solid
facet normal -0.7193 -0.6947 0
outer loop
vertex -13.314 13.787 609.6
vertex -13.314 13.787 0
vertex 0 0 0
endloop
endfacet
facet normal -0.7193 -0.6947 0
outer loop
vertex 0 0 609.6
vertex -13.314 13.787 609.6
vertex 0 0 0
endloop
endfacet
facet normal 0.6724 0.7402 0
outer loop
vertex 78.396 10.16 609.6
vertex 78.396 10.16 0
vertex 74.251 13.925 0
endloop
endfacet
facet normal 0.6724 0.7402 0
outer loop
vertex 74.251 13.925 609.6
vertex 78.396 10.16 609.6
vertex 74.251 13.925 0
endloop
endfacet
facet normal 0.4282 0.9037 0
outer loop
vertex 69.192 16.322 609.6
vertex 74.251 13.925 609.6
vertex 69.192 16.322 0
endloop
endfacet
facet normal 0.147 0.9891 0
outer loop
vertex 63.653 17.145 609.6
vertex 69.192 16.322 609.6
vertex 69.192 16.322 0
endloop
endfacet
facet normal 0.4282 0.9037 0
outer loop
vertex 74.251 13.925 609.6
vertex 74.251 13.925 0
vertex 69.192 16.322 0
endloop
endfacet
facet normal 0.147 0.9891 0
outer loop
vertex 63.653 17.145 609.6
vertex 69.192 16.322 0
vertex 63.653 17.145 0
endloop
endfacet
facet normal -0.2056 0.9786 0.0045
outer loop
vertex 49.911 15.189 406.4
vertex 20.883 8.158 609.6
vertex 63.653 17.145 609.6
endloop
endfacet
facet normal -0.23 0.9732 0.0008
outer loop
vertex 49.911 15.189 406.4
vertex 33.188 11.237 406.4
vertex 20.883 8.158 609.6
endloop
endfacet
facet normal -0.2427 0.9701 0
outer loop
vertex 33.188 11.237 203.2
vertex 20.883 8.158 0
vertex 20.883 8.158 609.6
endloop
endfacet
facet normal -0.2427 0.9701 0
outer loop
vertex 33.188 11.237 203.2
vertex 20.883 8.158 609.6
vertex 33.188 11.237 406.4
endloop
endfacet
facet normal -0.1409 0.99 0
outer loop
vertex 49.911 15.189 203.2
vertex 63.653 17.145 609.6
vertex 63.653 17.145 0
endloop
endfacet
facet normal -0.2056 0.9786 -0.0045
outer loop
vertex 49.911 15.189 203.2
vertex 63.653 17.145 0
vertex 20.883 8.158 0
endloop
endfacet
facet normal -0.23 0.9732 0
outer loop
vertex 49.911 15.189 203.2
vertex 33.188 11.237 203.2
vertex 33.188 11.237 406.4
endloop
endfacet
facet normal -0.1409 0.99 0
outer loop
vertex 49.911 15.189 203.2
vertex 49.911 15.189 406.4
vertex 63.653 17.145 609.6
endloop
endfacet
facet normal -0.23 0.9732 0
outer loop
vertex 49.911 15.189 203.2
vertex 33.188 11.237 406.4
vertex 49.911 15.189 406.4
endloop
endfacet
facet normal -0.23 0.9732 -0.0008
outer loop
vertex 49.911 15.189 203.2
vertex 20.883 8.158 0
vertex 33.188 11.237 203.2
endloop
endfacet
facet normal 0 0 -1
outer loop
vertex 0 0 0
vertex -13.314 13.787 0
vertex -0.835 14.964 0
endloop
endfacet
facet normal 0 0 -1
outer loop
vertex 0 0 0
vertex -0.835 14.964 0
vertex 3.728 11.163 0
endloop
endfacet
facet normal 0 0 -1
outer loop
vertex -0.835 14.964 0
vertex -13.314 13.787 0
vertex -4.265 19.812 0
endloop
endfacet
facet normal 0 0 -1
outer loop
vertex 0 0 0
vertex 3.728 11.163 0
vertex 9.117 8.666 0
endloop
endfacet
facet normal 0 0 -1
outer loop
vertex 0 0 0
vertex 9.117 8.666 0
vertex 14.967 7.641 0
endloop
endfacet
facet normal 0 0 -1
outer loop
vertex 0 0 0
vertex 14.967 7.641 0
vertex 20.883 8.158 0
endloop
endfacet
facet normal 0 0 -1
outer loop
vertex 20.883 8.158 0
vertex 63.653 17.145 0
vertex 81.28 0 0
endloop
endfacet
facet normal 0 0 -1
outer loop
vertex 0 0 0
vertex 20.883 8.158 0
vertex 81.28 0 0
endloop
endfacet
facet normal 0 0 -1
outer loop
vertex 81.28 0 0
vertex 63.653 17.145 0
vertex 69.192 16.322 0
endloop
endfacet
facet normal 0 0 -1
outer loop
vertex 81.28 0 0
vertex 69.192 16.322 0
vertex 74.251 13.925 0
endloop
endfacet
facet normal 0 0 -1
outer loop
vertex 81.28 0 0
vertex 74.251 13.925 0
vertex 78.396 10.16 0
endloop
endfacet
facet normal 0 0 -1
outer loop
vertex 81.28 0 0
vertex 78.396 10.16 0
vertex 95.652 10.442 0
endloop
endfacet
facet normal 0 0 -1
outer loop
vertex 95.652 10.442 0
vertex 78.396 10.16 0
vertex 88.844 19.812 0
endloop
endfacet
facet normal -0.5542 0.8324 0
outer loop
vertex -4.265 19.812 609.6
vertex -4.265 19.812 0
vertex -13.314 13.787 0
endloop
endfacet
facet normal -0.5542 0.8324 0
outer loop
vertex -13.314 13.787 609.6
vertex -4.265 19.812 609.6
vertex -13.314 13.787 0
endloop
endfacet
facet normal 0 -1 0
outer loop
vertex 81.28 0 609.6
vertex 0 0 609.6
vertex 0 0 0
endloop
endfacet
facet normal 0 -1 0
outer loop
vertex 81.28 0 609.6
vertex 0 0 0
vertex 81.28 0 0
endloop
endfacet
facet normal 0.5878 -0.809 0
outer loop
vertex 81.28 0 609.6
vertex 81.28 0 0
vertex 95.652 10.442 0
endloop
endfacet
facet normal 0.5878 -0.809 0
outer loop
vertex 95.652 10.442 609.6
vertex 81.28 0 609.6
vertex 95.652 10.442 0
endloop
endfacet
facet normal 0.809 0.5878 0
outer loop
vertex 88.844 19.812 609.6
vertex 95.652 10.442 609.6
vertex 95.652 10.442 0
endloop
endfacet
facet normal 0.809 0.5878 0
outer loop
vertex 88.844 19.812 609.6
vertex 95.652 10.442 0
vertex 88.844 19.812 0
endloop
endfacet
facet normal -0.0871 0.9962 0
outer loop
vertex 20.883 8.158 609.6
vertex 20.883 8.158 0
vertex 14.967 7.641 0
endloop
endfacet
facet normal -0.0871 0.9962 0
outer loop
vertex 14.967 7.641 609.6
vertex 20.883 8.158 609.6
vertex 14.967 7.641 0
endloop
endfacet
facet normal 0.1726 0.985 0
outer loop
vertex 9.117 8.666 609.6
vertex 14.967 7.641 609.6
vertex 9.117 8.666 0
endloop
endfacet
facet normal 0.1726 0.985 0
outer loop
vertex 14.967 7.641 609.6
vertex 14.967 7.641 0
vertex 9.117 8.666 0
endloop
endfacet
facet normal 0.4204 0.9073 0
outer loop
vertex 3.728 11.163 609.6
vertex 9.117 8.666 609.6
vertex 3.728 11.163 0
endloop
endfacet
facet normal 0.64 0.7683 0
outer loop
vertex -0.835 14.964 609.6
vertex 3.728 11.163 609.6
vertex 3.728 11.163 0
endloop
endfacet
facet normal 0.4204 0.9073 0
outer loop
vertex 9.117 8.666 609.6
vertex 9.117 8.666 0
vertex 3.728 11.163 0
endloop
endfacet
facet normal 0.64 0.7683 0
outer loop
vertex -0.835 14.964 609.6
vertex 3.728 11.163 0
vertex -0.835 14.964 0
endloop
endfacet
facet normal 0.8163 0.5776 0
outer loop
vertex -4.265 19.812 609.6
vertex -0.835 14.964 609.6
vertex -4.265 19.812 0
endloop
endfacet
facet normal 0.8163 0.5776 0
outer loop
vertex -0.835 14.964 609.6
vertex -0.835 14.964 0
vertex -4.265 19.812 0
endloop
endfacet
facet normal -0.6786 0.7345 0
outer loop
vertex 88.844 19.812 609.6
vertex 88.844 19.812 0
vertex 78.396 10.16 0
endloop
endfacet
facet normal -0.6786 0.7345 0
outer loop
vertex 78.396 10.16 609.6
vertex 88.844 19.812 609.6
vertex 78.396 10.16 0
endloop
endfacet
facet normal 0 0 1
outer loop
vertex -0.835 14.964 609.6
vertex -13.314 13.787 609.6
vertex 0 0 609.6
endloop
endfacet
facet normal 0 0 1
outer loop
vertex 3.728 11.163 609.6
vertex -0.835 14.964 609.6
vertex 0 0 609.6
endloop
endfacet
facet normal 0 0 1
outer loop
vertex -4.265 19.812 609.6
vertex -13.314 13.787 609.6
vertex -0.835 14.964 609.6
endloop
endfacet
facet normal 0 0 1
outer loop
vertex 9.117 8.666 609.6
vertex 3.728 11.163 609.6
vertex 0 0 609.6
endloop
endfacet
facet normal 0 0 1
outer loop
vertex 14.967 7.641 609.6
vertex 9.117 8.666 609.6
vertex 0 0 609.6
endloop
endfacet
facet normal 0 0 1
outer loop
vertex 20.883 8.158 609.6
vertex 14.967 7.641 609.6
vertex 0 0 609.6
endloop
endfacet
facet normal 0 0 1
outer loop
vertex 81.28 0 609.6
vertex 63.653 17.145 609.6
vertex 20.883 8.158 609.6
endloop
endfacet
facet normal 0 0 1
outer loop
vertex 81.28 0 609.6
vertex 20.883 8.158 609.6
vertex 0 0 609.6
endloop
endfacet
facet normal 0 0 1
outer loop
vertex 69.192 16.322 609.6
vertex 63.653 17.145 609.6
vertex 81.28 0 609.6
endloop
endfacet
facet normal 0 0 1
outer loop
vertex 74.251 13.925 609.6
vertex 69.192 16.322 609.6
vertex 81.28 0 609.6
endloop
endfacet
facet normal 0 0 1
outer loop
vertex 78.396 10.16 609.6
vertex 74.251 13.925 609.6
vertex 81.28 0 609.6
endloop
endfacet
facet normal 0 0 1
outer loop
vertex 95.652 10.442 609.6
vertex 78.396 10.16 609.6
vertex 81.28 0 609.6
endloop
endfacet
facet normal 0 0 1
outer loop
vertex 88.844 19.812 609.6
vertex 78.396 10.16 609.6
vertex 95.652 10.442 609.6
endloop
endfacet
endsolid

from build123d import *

# Parameters (mm, degrees)
F1_DEPTH = 609.6


with BuildPart() as f1:
    # F0 (on Top) → F1 (new body)
    with BuildSketch(Plane.XY):
        with BuildLine():
            Line((-13.314313, 13.787375), (0, 0))
            Line((0, 0), (81.28, 0))
            Line((81.28, 0), (95.651687, 10.441642))
            Line((95.651687, 10.441642), (88.843723, 19.812))
            Line((88.843723, 19.812), (78.395705, 10.16))
            ThreePointArc((78.395705, 10.16), (71.810031, 15.310411), (63.653308, 17.145))
            add(Edge.make_bspline(
                [(20.882963, 8.157931), (28.513048, 9.843092), (53.867209, 17.145), (63.653308, 17.145)],
                knots=[0, 0, 0, 0, 43.704346, 43.704346, 43.704346, 43.704346], degree=3))
            ThreePointArc((20.882963, 8.157931), (6.341194, 9.738896), (-4.265176, 19.812))
            Line((-4.265176, 19.812), (-13.314313, 13.787375))
        make_face()
    extrude(amount=F1_DEPTH)


solid = f1.part
